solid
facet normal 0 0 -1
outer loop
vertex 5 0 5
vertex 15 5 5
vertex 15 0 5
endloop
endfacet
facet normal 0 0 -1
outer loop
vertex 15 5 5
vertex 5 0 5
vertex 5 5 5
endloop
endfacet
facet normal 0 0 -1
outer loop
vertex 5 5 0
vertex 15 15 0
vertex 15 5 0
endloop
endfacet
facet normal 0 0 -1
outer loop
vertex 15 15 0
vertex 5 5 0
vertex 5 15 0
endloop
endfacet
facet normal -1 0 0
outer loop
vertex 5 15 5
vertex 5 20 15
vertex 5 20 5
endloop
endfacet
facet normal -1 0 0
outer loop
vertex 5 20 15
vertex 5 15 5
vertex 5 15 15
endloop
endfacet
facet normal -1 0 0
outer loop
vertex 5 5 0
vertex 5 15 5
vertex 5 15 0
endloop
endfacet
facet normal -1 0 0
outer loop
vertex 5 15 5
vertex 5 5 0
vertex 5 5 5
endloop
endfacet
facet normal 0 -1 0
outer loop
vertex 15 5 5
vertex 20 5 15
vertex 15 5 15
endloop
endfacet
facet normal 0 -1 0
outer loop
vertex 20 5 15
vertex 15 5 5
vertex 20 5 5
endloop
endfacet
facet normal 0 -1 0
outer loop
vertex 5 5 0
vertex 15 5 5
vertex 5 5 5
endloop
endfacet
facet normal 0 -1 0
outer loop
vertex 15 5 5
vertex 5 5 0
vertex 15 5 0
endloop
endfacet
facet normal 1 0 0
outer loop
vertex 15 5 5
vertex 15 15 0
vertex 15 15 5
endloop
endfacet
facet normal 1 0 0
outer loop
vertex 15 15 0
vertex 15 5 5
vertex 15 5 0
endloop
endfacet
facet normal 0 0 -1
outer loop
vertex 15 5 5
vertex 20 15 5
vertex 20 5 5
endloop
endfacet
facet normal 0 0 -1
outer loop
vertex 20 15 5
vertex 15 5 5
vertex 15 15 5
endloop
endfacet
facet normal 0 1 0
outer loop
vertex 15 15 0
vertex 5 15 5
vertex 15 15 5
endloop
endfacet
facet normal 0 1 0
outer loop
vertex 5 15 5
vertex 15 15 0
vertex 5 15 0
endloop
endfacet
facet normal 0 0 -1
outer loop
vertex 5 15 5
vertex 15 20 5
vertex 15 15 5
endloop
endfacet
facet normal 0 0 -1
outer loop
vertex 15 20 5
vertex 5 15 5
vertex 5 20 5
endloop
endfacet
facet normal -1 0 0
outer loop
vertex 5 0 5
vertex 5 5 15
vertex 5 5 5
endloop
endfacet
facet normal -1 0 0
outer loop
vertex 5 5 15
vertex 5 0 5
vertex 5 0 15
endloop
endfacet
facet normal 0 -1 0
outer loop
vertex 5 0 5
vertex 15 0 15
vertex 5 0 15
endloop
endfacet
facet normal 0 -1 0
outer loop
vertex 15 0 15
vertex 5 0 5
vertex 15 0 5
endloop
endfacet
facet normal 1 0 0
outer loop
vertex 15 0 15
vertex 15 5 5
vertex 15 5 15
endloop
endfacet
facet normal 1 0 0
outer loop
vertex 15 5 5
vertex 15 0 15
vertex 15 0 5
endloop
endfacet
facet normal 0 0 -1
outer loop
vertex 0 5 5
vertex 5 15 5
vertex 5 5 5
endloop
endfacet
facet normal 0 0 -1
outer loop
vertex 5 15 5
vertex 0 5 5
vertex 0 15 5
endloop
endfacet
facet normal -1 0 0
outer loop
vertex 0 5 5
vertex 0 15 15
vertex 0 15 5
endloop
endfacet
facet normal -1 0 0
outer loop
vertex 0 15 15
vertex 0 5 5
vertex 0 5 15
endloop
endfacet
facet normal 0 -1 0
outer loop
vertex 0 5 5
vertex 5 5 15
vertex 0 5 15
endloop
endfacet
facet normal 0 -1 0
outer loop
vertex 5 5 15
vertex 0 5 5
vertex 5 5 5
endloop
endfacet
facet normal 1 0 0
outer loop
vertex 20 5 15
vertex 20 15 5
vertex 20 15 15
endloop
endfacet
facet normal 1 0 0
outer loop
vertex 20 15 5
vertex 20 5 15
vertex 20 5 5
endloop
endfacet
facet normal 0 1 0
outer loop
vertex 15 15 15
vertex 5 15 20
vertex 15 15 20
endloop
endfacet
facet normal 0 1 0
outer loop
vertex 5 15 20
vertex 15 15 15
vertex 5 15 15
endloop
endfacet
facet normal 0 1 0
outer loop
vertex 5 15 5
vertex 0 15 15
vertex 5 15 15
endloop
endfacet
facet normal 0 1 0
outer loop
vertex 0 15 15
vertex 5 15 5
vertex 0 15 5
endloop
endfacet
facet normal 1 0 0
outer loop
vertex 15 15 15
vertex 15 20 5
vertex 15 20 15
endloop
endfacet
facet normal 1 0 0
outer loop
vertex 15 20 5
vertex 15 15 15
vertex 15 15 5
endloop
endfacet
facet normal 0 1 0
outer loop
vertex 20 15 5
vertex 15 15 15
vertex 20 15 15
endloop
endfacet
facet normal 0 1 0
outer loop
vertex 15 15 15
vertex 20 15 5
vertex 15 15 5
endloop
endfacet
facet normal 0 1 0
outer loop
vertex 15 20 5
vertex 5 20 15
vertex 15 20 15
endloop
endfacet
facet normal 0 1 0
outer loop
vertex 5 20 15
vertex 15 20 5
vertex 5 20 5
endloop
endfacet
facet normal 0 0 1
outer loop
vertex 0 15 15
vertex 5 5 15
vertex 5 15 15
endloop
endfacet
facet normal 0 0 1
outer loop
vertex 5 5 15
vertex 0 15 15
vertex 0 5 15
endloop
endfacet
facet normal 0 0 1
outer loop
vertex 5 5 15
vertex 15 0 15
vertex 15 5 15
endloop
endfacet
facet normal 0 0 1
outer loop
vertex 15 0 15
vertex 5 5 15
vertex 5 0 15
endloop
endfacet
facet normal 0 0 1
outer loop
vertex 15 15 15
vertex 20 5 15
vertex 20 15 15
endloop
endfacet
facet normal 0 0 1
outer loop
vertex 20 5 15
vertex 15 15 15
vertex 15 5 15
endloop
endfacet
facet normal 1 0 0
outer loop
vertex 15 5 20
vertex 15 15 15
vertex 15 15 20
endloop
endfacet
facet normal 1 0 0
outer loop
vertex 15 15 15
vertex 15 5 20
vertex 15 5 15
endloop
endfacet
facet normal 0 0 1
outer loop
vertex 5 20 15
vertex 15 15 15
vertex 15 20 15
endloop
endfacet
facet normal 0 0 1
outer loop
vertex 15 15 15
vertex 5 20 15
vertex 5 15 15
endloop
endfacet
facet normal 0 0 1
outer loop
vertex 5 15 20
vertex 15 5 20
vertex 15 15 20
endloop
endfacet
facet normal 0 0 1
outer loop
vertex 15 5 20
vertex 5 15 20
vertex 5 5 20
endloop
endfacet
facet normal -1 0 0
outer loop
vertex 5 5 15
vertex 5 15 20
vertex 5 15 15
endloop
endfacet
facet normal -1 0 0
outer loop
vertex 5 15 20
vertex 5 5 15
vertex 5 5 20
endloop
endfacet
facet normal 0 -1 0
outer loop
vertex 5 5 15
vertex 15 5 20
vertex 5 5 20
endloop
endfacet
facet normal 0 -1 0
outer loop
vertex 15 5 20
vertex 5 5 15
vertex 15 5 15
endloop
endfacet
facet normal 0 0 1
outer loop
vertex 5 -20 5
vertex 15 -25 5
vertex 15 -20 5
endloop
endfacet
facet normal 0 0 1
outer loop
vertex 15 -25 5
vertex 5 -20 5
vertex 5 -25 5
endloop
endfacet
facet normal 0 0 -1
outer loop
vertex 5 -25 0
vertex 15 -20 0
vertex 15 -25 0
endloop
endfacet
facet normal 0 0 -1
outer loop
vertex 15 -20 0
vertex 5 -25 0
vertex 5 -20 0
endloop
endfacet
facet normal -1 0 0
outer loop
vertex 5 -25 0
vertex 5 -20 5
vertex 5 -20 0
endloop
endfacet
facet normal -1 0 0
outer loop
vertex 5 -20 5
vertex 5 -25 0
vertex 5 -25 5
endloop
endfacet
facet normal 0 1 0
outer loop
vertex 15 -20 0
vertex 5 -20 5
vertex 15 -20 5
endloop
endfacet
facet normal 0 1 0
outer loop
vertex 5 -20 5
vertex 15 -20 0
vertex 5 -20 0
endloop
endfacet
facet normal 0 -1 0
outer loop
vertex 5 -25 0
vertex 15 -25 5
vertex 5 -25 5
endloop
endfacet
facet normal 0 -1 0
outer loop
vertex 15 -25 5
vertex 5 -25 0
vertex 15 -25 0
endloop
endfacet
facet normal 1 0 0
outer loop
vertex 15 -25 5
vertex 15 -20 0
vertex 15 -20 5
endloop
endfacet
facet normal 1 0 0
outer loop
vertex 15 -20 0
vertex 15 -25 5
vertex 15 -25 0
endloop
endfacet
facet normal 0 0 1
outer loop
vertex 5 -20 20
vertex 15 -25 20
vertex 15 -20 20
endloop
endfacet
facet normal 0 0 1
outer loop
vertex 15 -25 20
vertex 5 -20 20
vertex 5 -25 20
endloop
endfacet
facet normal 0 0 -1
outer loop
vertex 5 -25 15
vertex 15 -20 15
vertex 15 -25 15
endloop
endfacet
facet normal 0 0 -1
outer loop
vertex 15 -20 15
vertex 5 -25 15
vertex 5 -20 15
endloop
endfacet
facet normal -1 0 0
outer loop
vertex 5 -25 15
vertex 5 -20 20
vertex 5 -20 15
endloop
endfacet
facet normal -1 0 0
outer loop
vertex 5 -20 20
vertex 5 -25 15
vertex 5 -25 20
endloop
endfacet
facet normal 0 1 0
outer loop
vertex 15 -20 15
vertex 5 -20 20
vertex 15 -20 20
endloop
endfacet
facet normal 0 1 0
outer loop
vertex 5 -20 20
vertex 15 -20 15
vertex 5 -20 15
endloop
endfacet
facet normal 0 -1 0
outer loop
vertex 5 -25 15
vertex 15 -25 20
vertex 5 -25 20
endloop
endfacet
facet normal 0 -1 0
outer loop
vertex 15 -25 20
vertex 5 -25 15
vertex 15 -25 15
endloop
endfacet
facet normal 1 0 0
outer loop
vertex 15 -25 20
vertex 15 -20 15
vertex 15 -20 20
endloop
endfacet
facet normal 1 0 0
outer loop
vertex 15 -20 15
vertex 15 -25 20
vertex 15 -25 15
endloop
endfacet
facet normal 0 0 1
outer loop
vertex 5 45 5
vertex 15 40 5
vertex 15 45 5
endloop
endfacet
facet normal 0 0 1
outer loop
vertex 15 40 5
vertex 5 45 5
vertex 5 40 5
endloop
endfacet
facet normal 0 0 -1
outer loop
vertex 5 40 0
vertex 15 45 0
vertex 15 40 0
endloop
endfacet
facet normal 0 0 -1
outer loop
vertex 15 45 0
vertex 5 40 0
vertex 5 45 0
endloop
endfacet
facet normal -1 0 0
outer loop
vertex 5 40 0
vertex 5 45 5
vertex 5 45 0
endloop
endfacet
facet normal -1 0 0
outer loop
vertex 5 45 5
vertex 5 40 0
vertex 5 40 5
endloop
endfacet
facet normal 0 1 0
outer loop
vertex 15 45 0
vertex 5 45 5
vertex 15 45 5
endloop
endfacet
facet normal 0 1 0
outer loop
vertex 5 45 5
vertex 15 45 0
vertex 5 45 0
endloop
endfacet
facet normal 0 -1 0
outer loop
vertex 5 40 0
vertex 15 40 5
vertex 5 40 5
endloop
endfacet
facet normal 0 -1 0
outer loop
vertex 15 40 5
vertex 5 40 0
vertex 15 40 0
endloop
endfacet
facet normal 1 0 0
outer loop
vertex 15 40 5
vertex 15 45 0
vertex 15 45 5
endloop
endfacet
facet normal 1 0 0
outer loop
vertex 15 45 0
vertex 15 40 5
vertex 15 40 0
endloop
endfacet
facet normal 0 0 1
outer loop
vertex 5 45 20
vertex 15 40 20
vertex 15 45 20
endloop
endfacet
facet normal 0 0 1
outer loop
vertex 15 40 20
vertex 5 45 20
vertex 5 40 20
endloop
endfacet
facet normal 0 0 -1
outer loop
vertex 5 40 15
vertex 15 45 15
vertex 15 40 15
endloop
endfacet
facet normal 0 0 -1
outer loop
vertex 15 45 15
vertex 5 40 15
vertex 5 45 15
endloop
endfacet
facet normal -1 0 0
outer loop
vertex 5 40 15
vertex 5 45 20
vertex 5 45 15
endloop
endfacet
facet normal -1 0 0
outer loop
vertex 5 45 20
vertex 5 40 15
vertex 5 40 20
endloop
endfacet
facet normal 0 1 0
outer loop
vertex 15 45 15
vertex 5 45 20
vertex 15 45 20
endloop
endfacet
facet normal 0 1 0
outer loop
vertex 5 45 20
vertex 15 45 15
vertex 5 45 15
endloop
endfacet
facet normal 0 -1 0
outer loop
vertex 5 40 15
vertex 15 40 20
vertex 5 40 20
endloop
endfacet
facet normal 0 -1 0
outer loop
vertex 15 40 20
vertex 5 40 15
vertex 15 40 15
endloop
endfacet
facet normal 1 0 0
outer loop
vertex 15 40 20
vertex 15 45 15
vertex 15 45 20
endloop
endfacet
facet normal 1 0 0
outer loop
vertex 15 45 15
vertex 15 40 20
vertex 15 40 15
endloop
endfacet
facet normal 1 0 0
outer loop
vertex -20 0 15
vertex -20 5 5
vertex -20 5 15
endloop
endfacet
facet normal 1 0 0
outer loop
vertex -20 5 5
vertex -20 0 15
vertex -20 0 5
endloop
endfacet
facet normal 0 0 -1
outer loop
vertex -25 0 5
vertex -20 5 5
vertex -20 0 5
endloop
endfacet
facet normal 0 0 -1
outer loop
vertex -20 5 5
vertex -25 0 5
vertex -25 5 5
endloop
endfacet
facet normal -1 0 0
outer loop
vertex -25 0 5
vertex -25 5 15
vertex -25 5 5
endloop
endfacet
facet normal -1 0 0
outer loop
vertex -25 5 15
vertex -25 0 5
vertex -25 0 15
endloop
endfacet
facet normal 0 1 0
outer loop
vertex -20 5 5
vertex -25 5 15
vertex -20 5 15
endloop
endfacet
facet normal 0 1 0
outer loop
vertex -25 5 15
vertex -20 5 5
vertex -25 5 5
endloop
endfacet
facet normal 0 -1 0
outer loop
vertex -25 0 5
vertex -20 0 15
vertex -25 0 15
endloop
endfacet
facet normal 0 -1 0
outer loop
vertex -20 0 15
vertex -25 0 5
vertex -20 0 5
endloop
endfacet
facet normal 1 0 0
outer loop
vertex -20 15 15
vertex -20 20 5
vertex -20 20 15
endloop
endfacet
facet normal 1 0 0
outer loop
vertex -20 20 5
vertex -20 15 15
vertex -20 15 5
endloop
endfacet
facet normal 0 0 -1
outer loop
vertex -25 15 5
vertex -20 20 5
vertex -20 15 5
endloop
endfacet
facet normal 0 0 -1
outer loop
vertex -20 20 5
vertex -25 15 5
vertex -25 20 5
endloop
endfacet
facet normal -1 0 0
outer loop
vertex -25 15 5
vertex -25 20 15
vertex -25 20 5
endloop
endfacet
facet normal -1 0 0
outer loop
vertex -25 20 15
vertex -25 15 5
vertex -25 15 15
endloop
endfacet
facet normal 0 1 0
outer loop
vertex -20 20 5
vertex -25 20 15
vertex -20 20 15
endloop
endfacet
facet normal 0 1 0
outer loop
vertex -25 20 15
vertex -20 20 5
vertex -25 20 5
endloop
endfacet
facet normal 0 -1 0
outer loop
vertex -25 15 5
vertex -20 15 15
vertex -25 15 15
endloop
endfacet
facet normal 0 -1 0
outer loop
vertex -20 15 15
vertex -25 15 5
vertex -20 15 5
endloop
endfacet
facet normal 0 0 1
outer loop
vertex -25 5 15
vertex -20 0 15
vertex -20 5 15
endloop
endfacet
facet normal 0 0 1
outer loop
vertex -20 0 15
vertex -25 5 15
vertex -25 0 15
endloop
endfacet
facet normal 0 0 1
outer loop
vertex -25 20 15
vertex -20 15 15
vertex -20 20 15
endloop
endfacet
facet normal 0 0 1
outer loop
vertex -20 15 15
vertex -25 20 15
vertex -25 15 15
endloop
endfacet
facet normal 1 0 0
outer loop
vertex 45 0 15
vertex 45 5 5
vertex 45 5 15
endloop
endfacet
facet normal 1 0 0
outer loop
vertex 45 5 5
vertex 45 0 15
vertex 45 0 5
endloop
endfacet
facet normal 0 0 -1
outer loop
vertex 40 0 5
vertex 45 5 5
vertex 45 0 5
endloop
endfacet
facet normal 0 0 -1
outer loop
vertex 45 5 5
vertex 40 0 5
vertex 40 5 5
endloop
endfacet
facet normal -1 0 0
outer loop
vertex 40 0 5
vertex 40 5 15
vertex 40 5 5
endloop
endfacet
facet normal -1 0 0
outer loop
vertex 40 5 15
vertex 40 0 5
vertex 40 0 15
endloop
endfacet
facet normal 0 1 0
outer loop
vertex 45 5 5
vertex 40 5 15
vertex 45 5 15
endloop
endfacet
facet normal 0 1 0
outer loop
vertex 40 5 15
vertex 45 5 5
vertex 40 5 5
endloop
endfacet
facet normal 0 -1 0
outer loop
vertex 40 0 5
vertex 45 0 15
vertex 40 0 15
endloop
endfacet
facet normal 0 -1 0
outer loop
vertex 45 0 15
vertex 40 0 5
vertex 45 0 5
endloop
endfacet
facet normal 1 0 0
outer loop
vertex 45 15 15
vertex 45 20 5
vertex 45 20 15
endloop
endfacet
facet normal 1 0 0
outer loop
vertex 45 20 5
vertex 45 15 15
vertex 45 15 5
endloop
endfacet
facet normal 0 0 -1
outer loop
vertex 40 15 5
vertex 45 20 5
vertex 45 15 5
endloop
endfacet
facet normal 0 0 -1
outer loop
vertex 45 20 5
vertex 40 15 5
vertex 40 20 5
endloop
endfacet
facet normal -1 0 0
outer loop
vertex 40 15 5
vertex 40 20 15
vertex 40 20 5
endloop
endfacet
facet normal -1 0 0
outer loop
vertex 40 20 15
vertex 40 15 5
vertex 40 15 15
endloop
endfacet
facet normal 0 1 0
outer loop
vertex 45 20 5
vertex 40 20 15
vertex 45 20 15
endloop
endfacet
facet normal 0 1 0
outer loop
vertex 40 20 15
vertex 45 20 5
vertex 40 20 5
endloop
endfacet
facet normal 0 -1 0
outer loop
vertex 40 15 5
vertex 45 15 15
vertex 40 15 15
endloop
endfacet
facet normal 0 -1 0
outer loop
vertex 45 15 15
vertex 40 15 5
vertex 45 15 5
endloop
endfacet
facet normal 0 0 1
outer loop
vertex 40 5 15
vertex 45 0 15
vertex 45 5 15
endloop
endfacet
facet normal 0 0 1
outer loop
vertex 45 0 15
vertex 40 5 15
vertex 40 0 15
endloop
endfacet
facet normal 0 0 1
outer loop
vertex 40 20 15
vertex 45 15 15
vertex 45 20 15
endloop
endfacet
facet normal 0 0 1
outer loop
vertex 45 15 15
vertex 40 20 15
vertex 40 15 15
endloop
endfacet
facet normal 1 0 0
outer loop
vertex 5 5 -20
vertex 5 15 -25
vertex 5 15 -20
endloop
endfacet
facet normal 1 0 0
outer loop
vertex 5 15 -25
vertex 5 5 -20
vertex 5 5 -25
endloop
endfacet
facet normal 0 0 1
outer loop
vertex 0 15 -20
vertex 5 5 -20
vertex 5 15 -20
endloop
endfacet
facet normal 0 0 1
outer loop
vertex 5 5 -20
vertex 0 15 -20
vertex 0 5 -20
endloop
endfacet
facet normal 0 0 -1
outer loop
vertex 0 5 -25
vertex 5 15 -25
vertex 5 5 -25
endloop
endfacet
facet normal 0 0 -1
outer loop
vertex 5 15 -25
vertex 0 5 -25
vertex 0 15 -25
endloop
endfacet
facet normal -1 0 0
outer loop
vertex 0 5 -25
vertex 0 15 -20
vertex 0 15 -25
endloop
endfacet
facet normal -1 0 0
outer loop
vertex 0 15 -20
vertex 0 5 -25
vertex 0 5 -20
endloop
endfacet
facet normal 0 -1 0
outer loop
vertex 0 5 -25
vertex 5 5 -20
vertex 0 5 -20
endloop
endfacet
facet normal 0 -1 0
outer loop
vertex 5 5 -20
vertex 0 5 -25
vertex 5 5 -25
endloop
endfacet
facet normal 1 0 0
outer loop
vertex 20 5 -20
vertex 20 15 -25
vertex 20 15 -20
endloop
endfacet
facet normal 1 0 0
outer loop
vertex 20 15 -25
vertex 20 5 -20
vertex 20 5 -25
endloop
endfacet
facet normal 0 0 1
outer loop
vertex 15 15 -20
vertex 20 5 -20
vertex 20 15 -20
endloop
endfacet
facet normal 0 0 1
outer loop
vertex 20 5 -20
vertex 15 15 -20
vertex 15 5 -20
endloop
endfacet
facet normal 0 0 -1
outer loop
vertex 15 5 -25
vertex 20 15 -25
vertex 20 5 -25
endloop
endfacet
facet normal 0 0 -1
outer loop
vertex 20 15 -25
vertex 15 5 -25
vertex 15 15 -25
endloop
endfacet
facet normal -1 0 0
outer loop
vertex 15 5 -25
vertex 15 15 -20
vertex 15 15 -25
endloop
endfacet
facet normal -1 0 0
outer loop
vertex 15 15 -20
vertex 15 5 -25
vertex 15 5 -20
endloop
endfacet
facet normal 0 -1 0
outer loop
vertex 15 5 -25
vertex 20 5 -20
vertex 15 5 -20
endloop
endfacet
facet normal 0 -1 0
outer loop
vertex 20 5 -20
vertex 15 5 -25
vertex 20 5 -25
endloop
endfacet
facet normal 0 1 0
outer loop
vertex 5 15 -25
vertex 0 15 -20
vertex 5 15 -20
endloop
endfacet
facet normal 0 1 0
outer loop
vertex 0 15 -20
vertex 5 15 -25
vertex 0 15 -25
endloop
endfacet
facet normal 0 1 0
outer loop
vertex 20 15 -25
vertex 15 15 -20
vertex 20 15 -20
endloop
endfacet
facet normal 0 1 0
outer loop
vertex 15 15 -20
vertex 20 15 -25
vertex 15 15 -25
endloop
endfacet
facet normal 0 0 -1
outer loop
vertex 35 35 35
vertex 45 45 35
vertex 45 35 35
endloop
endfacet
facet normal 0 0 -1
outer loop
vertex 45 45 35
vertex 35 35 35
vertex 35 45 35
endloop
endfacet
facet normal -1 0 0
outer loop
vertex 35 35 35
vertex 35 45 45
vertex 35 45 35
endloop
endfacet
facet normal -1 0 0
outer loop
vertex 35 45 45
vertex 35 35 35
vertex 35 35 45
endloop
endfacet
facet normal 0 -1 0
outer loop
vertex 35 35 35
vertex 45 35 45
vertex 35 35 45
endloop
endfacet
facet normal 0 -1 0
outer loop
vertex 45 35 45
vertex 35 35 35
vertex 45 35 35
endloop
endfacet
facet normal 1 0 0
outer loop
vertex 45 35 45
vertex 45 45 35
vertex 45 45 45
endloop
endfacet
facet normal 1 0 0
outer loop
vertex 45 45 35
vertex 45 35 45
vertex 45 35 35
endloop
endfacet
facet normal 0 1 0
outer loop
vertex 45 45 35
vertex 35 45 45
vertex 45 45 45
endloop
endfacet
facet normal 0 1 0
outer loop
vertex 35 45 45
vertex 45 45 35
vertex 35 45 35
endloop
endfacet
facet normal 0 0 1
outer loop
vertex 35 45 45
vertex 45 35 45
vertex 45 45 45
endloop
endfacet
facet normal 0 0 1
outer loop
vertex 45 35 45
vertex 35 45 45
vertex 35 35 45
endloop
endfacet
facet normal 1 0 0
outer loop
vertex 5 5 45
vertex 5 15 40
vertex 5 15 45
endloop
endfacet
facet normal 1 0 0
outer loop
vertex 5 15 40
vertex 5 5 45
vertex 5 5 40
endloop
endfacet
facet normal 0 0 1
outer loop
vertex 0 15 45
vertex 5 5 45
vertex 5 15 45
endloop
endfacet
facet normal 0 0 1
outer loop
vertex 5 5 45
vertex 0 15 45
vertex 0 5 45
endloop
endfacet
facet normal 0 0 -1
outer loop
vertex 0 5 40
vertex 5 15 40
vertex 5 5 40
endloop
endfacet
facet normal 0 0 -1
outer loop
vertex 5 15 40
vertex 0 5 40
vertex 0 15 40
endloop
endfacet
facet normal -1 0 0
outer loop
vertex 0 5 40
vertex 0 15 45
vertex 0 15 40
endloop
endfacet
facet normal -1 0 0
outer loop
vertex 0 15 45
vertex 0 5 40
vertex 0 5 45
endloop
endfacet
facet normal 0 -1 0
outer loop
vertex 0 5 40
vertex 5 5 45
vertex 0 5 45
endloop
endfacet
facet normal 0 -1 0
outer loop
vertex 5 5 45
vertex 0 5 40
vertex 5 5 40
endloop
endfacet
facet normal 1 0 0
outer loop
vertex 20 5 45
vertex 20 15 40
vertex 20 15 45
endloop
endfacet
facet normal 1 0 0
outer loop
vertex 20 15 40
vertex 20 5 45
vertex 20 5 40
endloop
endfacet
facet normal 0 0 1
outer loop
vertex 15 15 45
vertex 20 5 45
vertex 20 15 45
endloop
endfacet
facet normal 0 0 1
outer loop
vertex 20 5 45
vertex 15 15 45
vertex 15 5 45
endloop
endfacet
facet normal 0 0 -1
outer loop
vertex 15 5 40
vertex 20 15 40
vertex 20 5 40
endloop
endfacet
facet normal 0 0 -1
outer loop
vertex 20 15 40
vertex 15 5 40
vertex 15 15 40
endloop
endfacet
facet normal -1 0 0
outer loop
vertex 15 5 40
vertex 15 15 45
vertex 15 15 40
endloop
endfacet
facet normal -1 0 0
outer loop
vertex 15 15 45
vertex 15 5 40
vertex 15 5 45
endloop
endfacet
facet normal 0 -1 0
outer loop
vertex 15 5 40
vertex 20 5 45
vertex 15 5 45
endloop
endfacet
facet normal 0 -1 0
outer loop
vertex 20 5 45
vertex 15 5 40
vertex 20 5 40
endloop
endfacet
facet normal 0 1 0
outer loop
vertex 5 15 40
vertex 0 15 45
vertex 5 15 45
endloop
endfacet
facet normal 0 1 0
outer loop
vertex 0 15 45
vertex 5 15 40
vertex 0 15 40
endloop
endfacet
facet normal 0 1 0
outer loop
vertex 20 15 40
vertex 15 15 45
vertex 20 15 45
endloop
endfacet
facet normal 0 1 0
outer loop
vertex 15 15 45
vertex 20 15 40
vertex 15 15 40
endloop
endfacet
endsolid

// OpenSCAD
// SCAD file for Six Piece Burr Puzzle
// 整体模型
union() {
  translate([5, 5, 0]) color([0, 0.8, 0, 0.85]) cube([5, 5, 5]);
  translate([10, 5, 0]) color([0, 0.8, 0, 0.85]) cube([5, 5, 5]);
  translate([5, 10, 0]) color([1, 0, 0, 0.85]) cube([5, 5, 5]);
  translate([10, 10, 0]) color([1, 0, 0, 0.85]) cube([5, 5, 5]);
  translate([5, 0, 5]) color([0.6, 0, 1, 0.85]) cube([5, 5, 5]);
  translate([10, 0, 5]) color([1, 0.4, 0, 0.85]) cube([5, 5, 5]);
  translate([0, 5, 5]) color([1, 0.8, 0, 0.85]) cube([5, 5, 5]);
  translate([5, 5, 5]) color([0.8, 0.8, 0.8, 0.85]) cube([5, 5, 5]);
  translate([10, 5, 5]) color([0.8, 0.8, 0.8, 0.85]) cube([5, 5, 5]);
  translate([15, 5, 5]) color([1, 0.8, 0, 0.85]) cube([5, 5, 5]);
  translate([0, 10, 5]) color([1, 0.8, 0, 0.85]) cube([5, 5, 5]);
  translate([5, 10, 5]) color([0.8, 0.8, 0.8, 0.85]) cube([5, 5, 5]);
  translate([10, 10, 5]) color([0.8, 0.8, 0.8, 0.85]) cube([5, 5, 5]);
  translate([15, 10, 5]) color([1, 0.8, 0, 0.85]) cube([5, 5, 5]);
  translate([5, 15, 5]) color([0.6, 0, 1, 0.85]) cube([5, 5, 5]);
  translate([10, 15, 5]) color([1, 0.4, 0, 0.85]) cube([5, 5, 5]);
  translate([5, 0, 10]) color([0.6, 0, 1, 0.85]) cube([5, 5, 5]);
  translate([10, 0, 10]) color([1, 0.4, 0, 0.85]) cube([5, 5, 5]);
  translate([0, 5, 10]) color([0, 0.4, 1, 0.85]) cube([5, 5, 5]);
  translate([5, 5, 10]) color([0.8, 0.8, 0.8, 0.85]) cube([5, 5, 5]);
  translate([10, 5, 10]) color([0.8, 0.8, 0.8, 0.85]) cube([5, 5, 5]);
  translate([15, 5, 10]) color([0, 0.4, 1, 0.85]) cube([5, 5, 5]);
  translate([0, 10, 10]) color([0, 0.4, 1, 0.85]) cube([5, 5, 5]);
  translate([5, 10, 10]) color([0.8, 0.8, 0.8, 0.85]) cube([5, 5, 5]);
  translate([10, 10, 10]) color([0.8, 0.8, 0.8, 0.85]) cube([5, 5, 5]);
  translate([15, 10, 10]) color([0, 0.4, 1, 0.85]) cube([5, 5, 5]);
  translate([5, 15, 10]) color([0.6, 0, 1, 0.85]) cube([5, 5, 5]);
  translate([10, 15, 10]) color([1, 0.4, 0, 0.85]) cube([5, 5, 5]);
  translate([5, 5, 15]) color([0, 0.8, 0, 0.85]) cube([5, 5, 5]);
  translate([10, 5, 15]) color([0, 0.8, 0, 0.85]) cube([5, 5, 5]);
  translate([5, 10, 15]) color([1, 0, 0, 0.85]) cube([5, 5, 5]);
  translate([10, 10, 15]) color([1, 0, 0, 0.85]) cube([5, 5, 5]);
}

// 零件 B
union() {
  translate([5.0, -25.0, 0.0]) color([0, 0.8, 0, 0.85]) cube([5, 5, 5]);
  translate([10.0, -25.0, 0.0]) color([0, 0.8, 0, 0.85]) cube([5, 5, 5]);
  translate([5.0, -25.0, 15.0]) color([0, 0.8, 0, 0.85]) cube([5, 5, 5]);
  translate([10.0, -25.0, 15.0]) color([0, 0.8, 0, 0.85]) cube([5, 5, 5]);
}

// 零件 A
union() {
  translate([5.0, 40.0, 0.0]) color([1, 0, 0, 0.85]) cube([5, 5, 5]);
  translate([10.0, 40.0, 0.0]) color([1, 0, 0, 0.85]) cube([5, 5, 5]);
  translate([5.0, 40.0, 15.0]) color([1, 0, 0, 0.85]) cube([5, 5, 5]);
  translate([10.0, 40.0, 15.0]) color([1, 0, 0, 0.85]) cube([5, 5, 5]);
}

// 零件 F
union() {
  translate([-25.0, 0.0, 5.0]) color([0.6, 0, 1, 0.85]) cube([5, 5, 5]);
  translate([-25.0, 15.0, 5.0]) color([0.6, 0, 1, 0.85]) cube([5, 5, 5]);
  translate([-25.0, 0.0, 10.0]) color([0.6, 0, 1, 0.85]) cube([5, 5, 5]);
  translate([-25.0, 15.0, 10.0]) color([0.6, 0, 1, 0.85]) cube([5, 5, 5]);
}

// 零件 E
union() {
  translate([40.0, 0.0, 5.0]) color([1, 0.4, 0, 0.85]) cube([5, 5, 5]);
  translate([40.0, 15.0, 5.0]) color([1, 0.4, 0, 0.85]) cube([5, 5, 5]);
  translate([40.0, 0.0, 10.0]) color([1, 0.4, 0, 0.85]) cube([5, 5, 5]);
  translate([40.0, 15.0, 10.0]) color([1, 0.4, 0, 0.85]) cube([5, 5, 5]);
}

// 零件 D
union() {
  translate([0.0, 5.0, -25.0]) color([1, 0.8, 0, 0.85]) cube([5, 5, 5]);
  translate([15.0, 5.0, -25.0]) color([1, 0.8, 0, 0.85]) cube([5, 5, 5]);
  translate([0.0, 10.0, -25.0]) color([1, 0.8, 0, 0.85]) cube([5, 5, 5]);
  translate([15.0, 10.0, -25.0]) color([1, 0.8, 0, 0.85]) cube([5, 5, 5]);
}

// 零件 public
union() {
  translate([35.0, 35.0, 35.0]) color([0.8, 0.8, 0.8, 0.85]) cube([5, 5, 5]);
  translate([40.0, 35.0, 35.0]) color([0.8, 0.8, 0.8, 0.85]) cube([5, 5, 5]);
  translate([35.0, 40.0, 35.0]) color([0.8, 0.8, 0.8, 0.85]) cube([5, 5, 5]);
  translate([40.0, 40.0, 35.0]) color([0.8, 0.8, 0.8, 0.85]) cube([5, 5, 5]);
  translate([35.0, 35.0, 40.0]) color([0.8, 0.8, 0.8, 0.85]) cube([5, 5, 5]);
  translate([40.0, 35.0, 40.0]) color([0.8, 0.8, 0.8, 0.85]) cube([5, 5, 5]);
  translate([35.0, 40.0, 40.0]) color([0.8, 0.8, 0.8, 0.85]) cube([5, 5, 5]);
  translate([40.0, 40.0, 40.0]) color([0.8, 0.8, 0.8, 0.85]) cube([5, 5, 5]);
}

// 零件 C
union() {
  translate([0.0, 5.0, 40.0]) color([0, 0.4, 1, 0.85]) cube([5, 5, 5]);
  translate([15.0, 5.0, 40.0]) color([0, 0.4, 1, 0.85]) cube([5, 5, 5]);
  translate([0.0, 10.0, 40.0]) color([0, 0.4, 1, 0.85]) cube([5, 5, 5]);
  translate([15.0, 10.0, 40.0]) color([0, 0.4, 1, 0.85]) cube([5, 5, 5]);
}
